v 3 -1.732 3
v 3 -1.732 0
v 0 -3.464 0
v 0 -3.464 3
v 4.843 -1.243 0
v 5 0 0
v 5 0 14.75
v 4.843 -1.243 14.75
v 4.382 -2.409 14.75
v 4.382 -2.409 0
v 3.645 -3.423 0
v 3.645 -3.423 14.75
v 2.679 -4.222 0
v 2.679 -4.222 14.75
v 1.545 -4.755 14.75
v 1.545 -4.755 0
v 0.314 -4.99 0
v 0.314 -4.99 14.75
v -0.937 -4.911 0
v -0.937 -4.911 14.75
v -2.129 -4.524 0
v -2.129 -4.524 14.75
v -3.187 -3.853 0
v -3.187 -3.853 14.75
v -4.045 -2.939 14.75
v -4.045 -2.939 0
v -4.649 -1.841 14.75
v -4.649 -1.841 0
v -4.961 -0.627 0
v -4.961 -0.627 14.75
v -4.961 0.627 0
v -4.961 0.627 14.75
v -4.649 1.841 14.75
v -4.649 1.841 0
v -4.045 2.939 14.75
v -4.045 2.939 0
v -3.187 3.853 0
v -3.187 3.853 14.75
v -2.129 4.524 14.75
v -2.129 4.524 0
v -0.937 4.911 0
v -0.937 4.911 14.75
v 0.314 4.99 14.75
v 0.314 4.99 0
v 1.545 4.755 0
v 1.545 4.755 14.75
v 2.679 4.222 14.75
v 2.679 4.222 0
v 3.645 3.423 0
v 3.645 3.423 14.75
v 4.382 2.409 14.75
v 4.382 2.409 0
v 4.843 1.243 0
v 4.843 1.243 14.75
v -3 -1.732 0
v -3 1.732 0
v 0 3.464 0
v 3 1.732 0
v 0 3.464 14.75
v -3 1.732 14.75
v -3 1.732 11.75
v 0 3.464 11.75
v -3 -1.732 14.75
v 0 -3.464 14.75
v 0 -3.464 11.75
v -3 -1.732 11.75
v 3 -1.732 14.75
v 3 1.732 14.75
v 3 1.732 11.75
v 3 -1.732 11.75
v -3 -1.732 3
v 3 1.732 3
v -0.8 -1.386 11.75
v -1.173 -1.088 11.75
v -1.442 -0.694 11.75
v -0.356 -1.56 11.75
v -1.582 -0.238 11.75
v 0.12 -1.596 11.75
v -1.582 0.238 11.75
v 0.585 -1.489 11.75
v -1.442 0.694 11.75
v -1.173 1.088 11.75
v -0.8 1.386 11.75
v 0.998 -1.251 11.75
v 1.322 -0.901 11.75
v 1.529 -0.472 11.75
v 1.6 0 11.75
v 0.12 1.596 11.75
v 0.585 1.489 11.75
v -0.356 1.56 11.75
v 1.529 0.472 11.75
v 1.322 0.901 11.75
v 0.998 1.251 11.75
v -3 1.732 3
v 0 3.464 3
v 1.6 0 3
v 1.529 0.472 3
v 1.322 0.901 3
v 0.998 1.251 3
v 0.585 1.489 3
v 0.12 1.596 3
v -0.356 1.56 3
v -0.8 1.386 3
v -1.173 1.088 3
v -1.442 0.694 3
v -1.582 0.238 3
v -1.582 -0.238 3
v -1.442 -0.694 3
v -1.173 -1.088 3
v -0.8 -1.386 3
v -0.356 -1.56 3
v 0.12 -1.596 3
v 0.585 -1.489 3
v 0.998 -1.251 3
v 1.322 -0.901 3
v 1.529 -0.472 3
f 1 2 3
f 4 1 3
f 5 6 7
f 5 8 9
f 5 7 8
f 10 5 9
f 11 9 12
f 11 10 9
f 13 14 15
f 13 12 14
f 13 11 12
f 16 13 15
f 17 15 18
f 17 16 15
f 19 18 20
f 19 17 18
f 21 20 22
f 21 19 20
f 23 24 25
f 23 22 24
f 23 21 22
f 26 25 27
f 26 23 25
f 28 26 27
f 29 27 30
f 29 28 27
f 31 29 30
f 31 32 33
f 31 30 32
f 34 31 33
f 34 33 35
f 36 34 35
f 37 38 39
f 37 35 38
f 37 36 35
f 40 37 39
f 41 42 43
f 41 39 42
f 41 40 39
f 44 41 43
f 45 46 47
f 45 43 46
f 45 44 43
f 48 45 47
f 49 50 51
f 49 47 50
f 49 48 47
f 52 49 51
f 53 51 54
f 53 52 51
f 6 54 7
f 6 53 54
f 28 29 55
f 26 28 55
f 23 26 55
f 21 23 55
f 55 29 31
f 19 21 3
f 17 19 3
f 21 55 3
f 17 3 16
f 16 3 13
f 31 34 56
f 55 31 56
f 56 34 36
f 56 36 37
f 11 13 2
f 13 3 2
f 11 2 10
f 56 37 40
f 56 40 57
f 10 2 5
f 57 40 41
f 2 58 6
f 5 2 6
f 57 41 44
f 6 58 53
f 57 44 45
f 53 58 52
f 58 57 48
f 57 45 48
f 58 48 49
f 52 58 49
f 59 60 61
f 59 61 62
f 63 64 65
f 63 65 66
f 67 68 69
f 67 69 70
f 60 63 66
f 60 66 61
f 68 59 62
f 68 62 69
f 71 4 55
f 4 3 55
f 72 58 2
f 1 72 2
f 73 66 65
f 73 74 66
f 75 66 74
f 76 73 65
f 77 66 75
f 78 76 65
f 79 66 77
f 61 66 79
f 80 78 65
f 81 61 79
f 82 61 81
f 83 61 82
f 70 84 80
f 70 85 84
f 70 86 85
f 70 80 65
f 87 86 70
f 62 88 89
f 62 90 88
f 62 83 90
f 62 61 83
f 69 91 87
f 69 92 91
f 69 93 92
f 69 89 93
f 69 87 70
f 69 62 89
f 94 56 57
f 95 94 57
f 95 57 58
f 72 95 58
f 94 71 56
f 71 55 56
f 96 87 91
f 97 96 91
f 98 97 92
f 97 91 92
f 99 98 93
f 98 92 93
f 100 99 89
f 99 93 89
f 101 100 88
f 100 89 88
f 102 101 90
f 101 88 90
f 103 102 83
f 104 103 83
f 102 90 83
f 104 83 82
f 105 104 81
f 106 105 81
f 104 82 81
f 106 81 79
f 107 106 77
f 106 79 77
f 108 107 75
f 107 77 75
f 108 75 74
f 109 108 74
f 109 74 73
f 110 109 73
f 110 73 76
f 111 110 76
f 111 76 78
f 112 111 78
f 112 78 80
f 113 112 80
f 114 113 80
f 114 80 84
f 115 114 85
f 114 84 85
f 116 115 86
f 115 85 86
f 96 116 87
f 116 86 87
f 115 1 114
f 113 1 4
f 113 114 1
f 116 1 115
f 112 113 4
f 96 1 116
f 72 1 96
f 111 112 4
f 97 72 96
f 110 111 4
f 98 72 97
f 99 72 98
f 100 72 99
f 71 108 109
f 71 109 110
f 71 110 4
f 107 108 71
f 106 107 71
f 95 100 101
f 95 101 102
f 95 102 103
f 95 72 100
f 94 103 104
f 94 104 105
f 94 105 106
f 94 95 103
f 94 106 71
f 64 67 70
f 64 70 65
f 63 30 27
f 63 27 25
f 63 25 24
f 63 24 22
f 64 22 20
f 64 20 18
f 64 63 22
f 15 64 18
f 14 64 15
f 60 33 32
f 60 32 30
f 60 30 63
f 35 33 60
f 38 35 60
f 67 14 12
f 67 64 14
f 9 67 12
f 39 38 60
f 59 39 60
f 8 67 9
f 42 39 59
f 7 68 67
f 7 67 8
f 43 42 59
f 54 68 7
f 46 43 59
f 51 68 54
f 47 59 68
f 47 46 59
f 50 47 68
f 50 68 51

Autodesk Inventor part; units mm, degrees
ref_plane "YZ Plane" through (0, 0, 0) normal (1, 0, 0) x (0, 1, 0)
ref_plane "XZ Plane" through (0, 0, 0) normal (0, 1, 0) x (-1, 0, 0)
ref_plane "XY Plane" through (0, 0, 0) normal (0, 0, 1) x (1, 0, 0)
sketch "Sketch1" plane through (0, 0, 0) normal (0, 0, 1) x (1, 0, 0)
  circle A0 centre (0, 0) radius 5
  dimension "d0" = 10
extrude "Extrusion1" add sketch "Sketch1" along normal blind 14.75
sketch "Sketch2" plane through (0, 0, 14.75) normal (0, 0, 1) x (1, 0, 0)
  circle A0 centre (0, 0) radius 1.6
  dimension "d3" = 3.2
extrude "Extrusion2" cut sketch "Sketch2" against normal blind 14.75
sketch "Sketch3" plane through (0, 0, 14.75) normal (0, 0, 1) x (1, 0, 0)
  line L0 (0, 3.4641) -> (3, 1.7321)
  line L1 (3, 1.7321) -> (3, -1.7321)
  line L2 (3, -1.7321) -> (0, -3.4641)
  line L3 (0, -3.4641) -> (-3, -1.7321)
  line L4 (-3, -1.7321) -> (-3, 1.7321)
  line L5 (-3, 1.7321) -> (0, 3.4641)
  point P0 (0, 0)
  point P1 (0, 0)
  dimension "d6" = 6
extrude "Extrusion3" cut sketch "Sketch3" against normal blind 3
sketch "Sketch4" plane through (0, 0, 0) normal (0, 0, -1) x (-1, 0, 0)
  circle A0 centre (0, 0) radius 1.6 projected
  line L0 (0, 3.4641) -> (-3, 1.7321) projected
  line L1 (3, 1.7321) -> (0, 3.4641) projected
  line L2 (3, -1.7321) -> (3, 1.7321) projected
  line L3 (0, -3.4641) -> (3, -1.7321) projected
  line L4 (-3, -1.7321) -> (0, -3.4641) projected
  line L5 (-3, 1.7321) -> (-3, -1.7321) projected
extrude "Extrusion4" cut sketch "Sketch4" against normal blind 3
properties part number "post"
